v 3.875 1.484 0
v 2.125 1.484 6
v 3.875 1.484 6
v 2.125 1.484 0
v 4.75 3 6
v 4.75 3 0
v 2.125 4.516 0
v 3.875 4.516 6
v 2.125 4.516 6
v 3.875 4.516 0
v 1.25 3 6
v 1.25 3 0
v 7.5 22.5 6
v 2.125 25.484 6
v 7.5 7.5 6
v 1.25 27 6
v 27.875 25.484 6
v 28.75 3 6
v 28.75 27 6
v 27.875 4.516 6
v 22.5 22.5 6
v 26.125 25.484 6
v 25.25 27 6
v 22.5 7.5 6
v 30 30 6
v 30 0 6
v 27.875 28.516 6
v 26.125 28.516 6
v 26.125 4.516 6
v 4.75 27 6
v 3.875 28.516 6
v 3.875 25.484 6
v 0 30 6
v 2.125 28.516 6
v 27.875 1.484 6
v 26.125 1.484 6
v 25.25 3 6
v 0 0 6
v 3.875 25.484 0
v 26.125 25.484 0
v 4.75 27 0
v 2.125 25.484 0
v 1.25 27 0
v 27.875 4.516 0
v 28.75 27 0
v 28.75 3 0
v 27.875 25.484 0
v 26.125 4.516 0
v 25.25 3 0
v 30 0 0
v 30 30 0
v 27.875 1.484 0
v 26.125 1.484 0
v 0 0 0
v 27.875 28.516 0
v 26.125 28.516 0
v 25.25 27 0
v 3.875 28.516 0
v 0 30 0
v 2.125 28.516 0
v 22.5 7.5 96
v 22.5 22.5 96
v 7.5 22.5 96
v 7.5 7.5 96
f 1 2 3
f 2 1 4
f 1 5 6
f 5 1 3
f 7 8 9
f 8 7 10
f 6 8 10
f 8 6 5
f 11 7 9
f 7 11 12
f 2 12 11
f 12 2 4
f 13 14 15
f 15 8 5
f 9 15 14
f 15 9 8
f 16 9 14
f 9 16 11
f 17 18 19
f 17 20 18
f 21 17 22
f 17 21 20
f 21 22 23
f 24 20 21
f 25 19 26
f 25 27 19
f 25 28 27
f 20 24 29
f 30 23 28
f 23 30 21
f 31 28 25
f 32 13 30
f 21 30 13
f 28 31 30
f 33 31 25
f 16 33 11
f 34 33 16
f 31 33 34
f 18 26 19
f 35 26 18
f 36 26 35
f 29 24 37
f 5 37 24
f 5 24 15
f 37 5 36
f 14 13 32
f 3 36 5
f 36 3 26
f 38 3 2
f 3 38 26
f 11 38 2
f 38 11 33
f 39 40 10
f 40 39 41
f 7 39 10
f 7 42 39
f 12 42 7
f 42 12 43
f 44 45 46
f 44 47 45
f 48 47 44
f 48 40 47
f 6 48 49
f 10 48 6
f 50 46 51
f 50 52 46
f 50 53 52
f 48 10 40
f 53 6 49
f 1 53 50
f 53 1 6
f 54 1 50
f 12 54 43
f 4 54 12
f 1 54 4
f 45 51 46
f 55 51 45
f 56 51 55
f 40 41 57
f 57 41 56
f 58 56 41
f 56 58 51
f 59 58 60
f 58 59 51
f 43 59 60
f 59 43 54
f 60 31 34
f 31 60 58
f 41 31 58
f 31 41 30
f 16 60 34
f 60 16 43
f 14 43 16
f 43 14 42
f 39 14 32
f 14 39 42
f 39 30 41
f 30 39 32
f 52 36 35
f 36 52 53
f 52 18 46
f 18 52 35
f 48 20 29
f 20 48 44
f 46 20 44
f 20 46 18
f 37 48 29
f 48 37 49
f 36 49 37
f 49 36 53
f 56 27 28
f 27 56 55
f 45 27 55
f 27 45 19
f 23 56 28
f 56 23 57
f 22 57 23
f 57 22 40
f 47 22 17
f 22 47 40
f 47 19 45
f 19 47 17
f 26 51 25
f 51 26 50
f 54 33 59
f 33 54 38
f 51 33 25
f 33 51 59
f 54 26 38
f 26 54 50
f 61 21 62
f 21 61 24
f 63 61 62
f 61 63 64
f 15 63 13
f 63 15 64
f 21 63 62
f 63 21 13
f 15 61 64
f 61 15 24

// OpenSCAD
mount_width = 30;
mount_thickness = 6;
mount_hole_radius = 1.75;
mount_hole_spacing = 24;
mounting_holes_offset = (mount_width - mount_hole_spacing) / 2;

tail_length = 90;
tail_width = 15;
tail_offset = tail_width / 2;

tail();

module tail(){
	tail_mount();

	translate([tail_offset, tail_offset, mount_thickness]) {
		cube([tail_width, tail_width, tail_length]);
	}

}

module tail_mount() {
	difference() {
		cube([mount_width, mount_width, mount_thickness]);
		translate([mounting_holes_offset, mounting_holes_offset, 0]) mounting_holes();
	}
}

module mounting_holes() {
	for (i = [0:1]){
		for (j = [0:1]){
			translate([mount_hole_spacing * i, mount_hole_spacing * j, 0]) {
				cylinder(r=mount_hole_radius, h=mount_thickness);
			}
		}
	}
}
